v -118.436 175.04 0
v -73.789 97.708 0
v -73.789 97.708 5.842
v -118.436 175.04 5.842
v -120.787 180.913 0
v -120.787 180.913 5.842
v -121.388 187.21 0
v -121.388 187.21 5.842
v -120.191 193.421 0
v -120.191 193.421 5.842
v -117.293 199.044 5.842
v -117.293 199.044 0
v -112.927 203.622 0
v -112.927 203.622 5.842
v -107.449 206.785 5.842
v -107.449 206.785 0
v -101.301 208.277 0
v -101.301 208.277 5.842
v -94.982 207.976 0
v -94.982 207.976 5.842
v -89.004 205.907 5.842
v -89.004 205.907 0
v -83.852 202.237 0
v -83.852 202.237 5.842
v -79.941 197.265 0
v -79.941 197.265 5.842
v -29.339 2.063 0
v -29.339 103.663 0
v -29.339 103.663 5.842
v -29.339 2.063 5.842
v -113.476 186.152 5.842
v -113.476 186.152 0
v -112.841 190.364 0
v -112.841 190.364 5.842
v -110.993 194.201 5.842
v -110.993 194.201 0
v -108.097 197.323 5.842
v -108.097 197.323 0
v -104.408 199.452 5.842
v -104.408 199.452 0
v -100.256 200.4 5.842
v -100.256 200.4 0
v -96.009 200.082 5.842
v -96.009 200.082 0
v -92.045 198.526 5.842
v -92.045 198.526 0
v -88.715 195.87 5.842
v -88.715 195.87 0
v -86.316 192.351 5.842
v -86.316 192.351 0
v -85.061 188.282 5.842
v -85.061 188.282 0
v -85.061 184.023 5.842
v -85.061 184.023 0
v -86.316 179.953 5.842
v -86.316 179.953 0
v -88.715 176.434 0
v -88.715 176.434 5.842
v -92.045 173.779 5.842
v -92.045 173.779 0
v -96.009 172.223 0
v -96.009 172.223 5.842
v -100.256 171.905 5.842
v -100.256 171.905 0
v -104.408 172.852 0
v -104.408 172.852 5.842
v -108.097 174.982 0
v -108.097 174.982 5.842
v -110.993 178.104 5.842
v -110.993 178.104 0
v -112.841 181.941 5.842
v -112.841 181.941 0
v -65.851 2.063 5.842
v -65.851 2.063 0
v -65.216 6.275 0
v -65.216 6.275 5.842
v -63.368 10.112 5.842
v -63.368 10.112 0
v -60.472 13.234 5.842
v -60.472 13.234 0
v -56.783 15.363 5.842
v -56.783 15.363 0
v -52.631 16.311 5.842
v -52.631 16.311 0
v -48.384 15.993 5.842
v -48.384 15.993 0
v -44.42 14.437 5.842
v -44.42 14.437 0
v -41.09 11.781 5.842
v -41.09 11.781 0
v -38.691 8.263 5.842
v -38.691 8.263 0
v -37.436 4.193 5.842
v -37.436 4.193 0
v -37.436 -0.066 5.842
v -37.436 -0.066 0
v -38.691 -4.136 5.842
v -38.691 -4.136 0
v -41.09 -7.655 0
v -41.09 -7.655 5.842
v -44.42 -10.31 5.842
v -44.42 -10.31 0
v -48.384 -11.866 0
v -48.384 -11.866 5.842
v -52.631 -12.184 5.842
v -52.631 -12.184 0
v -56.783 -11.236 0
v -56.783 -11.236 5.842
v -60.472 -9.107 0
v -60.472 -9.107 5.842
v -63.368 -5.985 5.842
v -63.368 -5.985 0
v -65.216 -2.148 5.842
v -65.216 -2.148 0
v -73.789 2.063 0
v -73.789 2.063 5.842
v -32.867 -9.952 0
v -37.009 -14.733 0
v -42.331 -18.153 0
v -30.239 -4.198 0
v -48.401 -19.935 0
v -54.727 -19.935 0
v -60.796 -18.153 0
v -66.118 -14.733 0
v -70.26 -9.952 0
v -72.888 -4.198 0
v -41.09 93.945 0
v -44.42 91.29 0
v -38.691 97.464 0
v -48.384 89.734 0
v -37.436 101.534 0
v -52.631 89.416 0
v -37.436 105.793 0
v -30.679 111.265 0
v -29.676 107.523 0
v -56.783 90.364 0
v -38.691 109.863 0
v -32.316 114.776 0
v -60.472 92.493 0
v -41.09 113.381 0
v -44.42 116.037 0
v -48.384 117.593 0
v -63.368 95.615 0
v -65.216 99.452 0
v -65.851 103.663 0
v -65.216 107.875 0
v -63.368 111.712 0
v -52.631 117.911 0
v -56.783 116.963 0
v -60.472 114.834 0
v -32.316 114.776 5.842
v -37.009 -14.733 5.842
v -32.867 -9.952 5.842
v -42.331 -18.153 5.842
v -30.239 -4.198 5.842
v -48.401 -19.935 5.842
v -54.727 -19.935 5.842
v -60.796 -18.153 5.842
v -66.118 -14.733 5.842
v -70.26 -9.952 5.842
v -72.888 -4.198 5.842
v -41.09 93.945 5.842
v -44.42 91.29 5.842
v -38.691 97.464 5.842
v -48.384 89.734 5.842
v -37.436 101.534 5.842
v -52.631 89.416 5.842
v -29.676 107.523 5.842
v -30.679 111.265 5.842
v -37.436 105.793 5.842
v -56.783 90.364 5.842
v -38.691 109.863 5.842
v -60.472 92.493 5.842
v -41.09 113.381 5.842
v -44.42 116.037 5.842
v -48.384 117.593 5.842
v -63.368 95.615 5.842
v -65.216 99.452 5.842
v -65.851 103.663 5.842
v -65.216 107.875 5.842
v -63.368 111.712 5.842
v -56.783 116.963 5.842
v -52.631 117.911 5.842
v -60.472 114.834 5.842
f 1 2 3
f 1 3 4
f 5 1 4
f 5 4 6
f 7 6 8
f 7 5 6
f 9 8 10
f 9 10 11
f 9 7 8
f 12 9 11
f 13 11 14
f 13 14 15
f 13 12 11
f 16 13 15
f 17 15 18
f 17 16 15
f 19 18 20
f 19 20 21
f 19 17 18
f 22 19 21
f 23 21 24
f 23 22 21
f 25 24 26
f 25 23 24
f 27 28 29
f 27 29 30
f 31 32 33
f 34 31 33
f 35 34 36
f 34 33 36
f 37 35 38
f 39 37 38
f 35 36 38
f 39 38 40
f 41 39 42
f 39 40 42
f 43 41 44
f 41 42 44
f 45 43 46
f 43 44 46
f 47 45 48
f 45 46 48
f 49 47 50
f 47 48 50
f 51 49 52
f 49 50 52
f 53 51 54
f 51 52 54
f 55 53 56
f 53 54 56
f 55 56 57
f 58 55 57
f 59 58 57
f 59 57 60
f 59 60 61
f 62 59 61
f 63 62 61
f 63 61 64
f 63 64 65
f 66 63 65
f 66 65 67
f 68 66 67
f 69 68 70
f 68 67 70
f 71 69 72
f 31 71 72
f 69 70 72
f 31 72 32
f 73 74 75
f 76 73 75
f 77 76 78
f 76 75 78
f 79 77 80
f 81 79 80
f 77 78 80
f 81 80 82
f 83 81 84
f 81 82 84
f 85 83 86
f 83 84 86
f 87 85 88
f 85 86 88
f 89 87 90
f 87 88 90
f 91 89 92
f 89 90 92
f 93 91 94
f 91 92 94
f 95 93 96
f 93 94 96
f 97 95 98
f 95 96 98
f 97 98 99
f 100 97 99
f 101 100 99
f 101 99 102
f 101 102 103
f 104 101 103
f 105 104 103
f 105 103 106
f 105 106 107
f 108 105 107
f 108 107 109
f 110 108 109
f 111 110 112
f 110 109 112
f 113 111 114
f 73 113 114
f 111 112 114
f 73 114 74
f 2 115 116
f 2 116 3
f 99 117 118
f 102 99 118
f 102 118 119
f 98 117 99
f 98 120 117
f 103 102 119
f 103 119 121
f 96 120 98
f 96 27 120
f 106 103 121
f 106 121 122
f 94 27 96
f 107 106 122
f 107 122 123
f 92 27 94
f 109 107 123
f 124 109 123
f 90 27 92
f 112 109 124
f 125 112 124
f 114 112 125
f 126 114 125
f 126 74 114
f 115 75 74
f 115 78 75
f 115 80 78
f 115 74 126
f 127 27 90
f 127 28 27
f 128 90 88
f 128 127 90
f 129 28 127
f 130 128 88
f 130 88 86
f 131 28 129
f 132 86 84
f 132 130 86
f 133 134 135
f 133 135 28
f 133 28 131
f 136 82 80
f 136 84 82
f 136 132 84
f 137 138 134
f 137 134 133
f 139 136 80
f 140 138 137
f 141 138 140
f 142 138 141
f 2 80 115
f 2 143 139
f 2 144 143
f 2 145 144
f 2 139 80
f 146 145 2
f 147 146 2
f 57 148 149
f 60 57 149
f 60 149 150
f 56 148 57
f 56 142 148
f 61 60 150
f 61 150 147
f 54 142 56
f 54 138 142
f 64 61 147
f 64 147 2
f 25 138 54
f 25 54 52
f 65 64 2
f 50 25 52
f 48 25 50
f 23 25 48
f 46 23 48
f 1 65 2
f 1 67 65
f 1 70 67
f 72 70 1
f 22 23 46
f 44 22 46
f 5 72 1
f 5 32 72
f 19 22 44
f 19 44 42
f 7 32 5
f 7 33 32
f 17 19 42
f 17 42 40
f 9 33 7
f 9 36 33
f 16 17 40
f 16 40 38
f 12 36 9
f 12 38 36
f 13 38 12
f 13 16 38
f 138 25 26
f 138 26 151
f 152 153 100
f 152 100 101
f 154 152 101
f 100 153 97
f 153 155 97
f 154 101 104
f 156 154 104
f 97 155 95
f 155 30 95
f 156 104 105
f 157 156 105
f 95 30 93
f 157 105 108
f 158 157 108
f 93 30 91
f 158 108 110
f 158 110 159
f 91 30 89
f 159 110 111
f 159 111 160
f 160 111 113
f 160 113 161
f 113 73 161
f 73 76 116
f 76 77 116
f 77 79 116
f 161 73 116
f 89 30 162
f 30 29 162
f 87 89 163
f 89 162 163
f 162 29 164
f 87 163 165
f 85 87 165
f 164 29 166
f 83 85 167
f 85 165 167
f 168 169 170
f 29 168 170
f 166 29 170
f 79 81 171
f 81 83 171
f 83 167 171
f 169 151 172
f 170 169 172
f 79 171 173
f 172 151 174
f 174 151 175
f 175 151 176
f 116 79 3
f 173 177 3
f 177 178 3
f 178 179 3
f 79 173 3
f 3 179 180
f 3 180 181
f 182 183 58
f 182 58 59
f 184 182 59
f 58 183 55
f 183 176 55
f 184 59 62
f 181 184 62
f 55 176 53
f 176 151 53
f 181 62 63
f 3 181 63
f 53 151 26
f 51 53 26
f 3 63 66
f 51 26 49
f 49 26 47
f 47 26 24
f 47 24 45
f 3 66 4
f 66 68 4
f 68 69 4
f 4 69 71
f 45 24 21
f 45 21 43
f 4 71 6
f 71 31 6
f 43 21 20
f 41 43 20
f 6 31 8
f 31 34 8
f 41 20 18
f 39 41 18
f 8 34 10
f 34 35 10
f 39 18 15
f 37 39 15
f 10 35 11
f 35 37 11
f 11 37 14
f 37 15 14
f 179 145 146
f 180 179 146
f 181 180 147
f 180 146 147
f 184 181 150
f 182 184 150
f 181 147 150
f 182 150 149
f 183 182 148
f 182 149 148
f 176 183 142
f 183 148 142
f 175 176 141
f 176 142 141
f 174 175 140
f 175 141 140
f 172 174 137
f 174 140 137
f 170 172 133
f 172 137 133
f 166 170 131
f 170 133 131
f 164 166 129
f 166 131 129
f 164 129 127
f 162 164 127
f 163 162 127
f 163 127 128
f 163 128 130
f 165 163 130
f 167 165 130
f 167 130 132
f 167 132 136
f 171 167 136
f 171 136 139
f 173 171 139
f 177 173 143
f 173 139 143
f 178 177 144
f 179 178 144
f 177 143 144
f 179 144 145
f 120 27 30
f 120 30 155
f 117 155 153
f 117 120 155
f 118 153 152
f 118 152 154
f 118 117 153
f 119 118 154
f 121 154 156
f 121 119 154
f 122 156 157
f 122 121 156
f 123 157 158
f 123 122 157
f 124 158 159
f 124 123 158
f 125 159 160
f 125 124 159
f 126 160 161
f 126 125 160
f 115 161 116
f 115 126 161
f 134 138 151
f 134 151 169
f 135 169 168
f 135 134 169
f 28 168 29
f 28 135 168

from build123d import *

# Parameters (mm, degrees)
SKETCH1_R           = 14.2875
BOSS_EXTRUDE1_DEPTH = 5.842


with BuildPart() as part:
    # Sketch1 → Boss-Extrude1 (new body)
    with BuildSketch(Plane(origin=(0, 0, 0), x_dir=(-1, 0, 0), z_dir=(0, 0, -1))):
        with BuildLine():
            Line((73.788575358, 2.063404121), (73.788575358, 97.70823332))
            Line((73.788575358, 97.70823332), (118.435989957, 175.039823832))
            ThreePointArc((118.435989957, 175.039823832), (110.301075358, 205.399738431), (79.941160759, 197.264823832))
            Line((79.941160759, 197.264823832), (32.316160759, 114.775904121))
            ThreePointArc((32.316160759, 114.775904121), (30.095873869, 109.415657399), (29.338575358, 103.663404121))
            Line((29.338575358, 103.663404121), (29.338575358, 2.063404121))
            ThreePointArc((29.338575358, 2.063404121), (51.563575358, -20.161595879), (73.788575358, 2.063404121))
        make_face()
        with Locations((51.563575358, 2.063404121)):
            Circle(SKETCH1_R, mode=Mode.SUBTRACT)
        with Locations((51.563575358, 103.663404121)):
            Circle(SKETCH1_R, mode=Mode.SUBTRACT)
        with Locations((99.188575358, 186.152323832)):
            Circle(SKETCH1_R, mode=Mode.SUBTRACT)
    extrude(amount=-BOSS_EXTRUDE1_DEPTH)


solid = part.part
